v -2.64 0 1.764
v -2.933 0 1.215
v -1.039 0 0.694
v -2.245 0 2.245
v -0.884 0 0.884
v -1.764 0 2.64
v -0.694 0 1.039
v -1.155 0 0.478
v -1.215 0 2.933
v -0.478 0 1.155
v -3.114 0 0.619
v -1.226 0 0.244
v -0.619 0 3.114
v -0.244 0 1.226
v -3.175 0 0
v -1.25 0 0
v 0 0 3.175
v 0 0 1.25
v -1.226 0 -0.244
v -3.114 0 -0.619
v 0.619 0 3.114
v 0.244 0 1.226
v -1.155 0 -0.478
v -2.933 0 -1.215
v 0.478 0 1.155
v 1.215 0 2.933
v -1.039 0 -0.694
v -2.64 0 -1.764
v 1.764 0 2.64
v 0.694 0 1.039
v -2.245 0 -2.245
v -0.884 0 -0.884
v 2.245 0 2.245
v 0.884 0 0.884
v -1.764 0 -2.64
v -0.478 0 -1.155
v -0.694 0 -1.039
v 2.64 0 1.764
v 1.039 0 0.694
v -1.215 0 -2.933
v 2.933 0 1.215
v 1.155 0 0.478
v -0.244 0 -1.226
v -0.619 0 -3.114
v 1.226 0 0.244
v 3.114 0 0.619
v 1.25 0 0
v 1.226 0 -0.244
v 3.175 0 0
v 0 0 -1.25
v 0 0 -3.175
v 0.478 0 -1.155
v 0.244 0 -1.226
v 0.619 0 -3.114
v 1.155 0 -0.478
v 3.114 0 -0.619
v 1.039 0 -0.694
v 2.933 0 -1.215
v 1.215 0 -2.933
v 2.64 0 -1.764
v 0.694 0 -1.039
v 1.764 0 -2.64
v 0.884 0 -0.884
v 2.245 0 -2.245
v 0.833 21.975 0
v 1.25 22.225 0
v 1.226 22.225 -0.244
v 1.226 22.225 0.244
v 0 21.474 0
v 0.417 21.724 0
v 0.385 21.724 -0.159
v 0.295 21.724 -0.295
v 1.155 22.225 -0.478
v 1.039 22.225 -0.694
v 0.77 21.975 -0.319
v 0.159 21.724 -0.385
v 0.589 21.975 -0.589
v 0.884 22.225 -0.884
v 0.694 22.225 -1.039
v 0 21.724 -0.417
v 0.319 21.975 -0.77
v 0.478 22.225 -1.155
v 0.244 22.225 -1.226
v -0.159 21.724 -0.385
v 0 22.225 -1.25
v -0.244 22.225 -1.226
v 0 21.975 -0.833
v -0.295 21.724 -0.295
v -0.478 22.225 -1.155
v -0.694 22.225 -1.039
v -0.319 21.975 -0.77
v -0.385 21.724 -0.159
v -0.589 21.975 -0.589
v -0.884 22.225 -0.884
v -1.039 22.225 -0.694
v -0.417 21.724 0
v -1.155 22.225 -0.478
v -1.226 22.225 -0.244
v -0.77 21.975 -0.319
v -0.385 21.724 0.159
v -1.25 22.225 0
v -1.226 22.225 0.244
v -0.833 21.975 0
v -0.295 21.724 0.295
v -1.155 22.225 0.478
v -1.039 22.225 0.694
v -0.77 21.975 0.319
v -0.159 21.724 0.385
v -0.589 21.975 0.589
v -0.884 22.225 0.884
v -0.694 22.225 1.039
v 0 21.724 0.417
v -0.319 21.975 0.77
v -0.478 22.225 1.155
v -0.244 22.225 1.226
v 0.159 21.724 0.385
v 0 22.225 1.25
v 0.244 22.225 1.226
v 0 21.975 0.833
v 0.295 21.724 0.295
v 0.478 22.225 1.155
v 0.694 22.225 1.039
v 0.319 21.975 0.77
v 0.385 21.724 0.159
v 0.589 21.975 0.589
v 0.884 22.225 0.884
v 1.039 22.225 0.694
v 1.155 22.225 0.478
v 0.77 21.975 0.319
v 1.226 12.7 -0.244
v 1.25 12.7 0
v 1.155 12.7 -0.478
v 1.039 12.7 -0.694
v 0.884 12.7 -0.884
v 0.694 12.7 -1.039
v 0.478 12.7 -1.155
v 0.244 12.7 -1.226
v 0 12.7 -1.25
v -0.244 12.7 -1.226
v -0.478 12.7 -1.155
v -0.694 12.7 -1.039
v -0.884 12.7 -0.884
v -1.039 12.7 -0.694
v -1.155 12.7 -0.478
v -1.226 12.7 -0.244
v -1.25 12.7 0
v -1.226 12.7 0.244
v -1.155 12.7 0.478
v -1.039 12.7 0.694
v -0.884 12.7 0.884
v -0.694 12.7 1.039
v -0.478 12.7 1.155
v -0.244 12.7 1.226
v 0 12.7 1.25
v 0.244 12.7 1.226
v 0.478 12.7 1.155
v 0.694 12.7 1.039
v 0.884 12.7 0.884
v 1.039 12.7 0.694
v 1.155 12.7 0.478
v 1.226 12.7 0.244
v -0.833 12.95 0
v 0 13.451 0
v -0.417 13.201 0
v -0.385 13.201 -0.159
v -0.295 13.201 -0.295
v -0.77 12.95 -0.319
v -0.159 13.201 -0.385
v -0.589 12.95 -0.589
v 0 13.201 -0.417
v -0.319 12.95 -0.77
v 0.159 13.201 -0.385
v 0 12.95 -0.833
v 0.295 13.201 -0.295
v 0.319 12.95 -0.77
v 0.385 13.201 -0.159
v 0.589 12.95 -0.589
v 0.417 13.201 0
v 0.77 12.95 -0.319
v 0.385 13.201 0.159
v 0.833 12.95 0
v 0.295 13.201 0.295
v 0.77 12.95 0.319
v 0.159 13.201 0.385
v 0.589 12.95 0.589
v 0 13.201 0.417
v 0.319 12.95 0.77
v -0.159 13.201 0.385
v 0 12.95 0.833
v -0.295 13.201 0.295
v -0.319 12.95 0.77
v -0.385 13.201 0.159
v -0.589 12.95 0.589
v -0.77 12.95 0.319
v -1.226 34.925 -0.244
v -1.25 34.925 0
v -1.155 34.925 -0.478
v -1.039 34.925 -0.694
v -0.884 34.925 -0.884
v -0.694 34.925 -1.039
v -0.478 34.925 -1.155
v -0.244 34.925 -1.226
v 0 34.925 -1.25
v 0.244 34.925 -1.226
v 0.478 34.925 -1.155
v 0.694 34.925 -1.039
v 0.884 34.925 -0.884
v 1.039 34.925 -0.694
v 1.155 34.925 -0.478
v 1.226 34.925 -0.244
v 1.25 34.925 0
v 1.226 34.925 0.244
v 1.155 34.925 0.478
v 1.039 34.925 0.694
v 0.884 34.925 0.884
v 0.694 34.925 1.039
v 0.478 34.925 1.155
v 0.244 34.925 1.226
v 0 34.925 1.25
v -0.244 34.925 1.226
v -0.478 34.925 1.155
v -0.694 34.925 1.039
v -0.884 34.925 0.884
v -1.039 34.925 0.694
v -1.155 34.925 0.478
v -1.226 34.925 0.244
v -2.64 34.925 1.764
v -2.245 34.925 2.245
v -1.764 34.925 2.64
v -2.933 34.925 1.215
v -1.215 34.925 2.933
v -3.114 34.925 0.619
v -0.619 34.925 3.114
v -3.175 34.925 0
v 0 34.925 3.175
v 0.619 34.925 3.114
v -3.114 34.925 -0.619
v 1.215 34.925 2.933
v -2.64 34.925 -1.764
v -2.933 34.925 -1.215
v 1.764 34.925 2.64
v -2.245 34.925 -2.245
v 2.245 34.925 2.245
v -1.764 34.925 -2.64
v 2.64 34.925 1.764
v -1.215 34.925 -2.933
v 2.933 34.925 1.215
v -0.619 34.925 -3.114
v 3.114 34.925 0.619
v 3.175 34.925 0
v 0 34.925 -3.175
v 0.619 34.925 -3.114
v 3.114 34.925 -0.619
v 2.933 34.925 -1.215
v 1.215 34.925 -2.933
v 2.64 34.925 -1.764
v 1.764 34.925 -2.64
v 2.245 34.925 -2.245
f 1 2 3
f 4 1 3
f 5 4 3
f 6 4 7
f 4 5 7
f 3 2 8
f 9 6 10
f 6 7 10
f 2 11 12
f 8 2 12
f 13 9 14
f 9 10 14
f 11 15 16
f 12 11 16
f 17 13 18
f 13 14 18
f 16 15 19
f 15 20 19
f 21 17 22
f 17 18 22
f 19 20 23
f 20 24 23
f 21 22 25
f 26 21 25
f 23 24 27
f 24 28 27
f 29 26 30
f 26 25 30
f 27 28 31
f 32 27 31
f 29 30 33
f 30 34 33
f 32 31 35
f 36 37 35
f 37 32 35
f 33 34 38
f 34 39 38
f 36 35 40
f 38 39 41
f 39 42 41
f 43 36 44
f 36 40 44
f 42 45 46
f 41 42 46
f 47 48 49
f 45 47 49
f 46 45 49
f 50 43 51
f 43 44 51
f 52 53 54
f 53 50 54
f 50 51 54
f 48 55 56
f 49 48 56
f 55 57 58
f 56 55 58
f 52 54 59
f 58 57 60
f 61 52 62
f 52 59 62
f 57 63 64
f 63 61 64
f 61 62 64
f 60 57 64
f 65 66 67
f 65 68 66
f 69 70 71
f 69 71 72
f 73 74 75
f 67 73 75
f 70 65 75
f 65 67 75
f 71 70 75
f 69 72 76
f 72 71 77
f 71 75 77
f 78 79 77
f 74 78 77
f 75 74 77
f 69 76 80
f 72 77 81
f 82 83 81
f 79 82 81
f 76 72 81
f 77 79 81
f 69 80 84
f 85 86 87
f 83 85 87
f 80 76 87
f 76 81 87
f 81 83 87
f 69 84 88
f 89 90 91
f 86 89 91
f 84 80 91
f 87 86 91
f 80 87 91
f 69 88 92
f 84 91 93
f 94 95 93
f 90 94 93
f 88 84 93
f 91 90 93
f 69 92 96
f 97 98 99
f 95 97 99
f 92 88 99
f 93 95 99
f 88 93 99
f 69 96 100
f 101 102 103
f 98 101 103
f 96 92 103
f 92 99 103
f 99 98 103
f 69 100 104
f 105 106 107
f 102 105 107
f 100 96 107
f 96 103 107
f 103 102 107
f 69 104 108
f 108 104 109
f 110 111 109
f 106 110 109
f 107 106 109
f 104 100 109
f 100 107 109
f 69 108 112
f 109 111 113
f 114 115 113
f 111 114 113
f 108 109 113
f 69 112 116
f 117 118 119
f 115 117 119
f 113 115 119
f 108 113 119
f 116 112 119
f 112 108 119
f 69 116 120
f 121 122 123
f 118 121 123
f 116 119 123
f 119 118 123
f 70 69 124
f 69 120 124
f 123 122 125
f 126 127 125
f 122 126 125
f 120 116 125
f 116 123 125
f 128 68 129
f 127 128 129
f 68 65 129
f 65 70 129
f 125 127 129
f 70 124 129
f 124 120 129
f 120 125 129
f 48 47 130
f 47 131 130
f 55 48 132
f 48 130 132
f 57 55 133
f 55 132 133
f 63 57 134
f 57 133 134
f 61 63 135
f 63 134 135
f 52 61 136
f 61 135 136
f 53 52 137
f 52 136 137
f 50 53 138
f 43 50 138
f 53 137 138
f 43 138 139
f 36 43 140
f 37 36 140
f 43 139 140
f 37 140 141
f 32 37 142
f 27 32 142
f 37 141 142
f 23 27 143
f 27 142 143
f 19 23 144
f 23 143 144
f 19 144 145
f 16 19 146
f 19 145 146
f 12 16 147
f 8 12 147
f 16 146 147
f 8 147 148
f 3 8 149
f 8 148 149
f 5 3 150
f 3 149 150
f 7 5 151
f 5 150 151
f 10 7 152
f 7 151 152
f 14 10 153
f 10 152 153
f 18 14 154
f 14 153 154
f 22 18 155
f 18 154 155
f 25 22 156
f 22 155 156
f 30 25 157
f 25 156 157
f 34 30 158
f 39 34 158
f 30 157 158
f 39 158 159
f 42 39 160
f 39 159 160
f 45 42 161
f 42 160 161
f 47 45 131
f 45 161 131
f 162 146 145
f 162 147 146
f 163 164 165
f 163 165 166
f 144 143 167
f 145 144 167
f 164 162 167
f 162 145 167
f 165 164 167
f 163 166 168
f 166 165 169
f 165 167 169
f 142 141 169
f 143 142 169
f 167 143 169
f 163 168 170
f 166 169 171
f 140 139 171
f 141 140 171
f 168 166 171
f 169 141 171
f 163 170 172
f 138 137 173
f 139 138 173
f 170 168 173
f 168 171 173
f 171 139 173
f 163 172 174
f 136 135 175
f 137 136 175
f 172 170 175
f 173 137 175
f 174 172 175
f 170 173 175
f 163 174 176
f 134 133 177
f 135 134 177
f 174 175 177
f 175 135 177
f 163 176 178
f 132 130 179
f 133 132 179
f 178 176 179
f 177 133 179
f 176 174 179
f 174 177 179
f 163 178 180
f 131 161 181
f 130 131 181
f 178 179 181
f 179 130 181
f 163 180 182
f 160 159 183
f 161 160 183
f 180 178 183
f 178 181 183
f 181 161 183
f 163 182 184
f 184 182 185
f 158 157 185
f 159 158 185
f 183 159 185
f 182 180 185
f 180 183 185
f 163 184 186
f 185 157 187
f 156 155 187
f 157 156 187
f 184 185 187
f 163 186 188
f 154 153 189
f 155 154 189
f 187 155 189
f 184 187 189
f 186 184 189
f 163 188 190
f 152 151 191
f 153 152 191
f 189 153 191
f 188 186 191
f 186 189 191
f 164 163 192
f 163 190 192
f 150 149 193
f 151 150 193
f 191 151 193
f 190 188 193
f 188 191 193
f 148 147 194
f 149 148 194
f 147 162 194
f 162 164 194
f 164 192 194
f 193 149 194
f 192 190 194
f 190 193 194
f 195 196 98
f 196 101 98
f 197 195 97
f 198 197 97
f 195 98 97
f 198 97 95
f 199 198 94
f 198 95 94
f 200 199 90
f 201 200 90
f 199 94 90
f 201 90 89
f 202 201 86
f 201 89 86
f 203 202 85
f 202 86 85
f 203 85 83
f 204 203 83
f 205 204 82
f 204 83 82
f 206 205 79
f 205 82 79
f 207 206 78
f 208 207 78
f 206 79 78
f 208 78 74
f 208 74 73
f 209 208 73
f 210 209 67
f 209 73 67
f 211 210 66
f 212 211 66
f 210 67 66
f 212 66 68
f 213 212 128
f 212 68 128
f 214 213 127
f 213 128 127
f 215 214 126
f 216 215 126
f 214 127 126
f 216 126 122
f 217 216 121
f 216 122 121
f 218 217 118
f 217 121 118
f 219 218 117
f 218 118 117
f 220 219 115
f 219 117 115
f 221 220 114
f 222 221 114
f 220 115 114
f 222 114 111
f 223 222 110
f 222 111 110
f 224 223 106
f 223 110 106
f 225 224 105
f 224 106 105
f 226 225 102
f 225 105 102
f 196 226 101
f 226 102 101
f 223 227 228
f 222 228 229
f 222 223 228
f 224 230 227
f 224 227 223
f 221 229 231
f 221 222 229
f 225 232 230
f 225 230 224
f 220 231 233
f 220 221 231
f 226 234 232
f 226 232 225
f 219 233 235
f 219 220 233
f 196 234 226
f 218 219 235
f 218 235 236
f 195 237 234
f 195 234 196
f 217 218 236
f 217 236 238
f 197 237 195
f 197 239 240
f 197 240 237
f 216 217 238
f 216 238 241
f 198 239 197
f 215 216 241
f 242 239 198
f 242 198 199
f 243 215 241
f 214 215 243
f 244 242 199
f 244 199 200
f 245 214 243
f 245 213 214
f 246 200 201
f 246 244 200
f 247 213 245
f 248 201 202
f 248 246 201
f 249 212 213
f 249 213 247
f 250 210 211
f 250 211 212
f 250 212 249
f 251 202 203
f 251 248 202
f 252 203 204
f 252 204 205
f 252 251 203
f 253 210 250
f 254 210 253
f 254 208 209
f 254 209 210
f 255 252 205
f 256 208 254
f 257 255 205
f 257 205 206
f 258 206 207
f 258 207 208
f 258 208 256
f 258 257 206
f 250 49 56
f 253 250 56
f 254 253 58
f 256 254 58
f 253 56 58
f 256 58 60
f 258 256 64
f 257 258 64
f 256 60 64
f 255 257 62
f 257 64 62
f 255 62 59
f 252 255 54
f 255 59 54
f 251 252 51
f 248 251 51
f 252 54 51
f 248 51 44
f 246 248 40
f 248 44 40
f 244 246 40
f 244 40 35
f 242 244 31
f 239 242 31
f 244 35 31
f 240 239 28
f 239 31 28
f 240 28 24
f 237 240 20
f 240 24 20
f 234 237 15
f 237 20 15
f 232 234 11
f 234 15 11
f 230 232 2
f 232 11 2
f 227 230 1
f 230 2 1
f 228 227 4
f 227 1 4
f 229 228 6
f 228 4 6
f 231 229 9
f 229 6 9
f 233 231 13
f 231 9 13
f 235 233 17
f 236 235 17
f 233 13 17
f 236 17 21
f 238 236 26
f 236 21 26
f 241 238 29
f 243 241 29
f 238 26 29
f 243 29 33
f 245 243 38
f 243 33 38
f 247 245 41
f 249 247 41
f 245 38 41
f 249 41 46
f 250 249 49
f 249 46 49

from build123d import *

# Parameters (mm, degrees)
SKETCH1_R                 = 3.175
BOSS_EXTRUDE1_DEPTH       = 34.925
M3X0_5_TAPPED_HOLE1_D     = 2.5
M3X0_5_TAPPED_HOLE1_DEPTH = 12.7
M3X0_5_TAPPED_HOLE1_TIP   = 0.751075774
M3X0_5_TAPPED_HOLE2_D     = 2.5
M3X0_5_TAPPED_HOLE2_DEPTH = 12.7
M3X0_5_TAPPED_HOLE2_TIP   = 0.751075774


with BuildPart() as part:
    # Sketch1 → Boss-Extrude1 (new body)
    with BuildSketch(Plane(origin=(0, 0, 0), x_dir=(1, 0, 0), z_dir=(0, 1, 0))):
        Circle(SKETCH1_R)
    extrude(amount=BOSS_EXTRUDE1_DEPTH)

    # M3x0.5 Tapped Hole1
    with Locations(Plane(origin=(0, 34.925, 0), x_dir=(1, 0, 0), z_dir=(0, 1, 0))):
        with Locations((0, 0)):
            Hole(M3X0_5_TAPPED_HOLE1_D / 2, depth=M3X0_5_TAPPED_HOLE1_DEPTH)
            with Locations((0, 0, -(M3X0_5_TAPPED_HOLE1_DEPTH + M3X0_5_TAPPED_HOLE1_TIP / 2))):  # 118° drill point
                Cone(0, M3X0_5_TAPPED_HOLE1_D / 2, M3X0_5_TAPPED_HOLE1_TIP, mode=Mode.SUBTRACT)

    # M3x0.5 Tapped Hole2
    with Locations(Plane(origin=(0, 0, 0), x_dir=(-1, 0, 0), z_dir=(0, -1, 0))):
        with Locations((0, 0)):
            Hole(M3X0_5_TAPPED_HOLE2_D / 2, depth=M3X0_5_TAPPED_HOLE2_DEPTH)
            with Locations((0, 0, -(M3X0_5_TAPPED_HOLE2_DEPTH + M3X0_5_TAPPED_HOLE2_TIP / 2))):  # 118° drill point
                Cone(0, M3X0_5_TAPPED_HOLE2_D / 2, M3X0_5_TAPPED_HOLE2_TIP, mode=Mode.SUBTRACT)


solid = part.part
